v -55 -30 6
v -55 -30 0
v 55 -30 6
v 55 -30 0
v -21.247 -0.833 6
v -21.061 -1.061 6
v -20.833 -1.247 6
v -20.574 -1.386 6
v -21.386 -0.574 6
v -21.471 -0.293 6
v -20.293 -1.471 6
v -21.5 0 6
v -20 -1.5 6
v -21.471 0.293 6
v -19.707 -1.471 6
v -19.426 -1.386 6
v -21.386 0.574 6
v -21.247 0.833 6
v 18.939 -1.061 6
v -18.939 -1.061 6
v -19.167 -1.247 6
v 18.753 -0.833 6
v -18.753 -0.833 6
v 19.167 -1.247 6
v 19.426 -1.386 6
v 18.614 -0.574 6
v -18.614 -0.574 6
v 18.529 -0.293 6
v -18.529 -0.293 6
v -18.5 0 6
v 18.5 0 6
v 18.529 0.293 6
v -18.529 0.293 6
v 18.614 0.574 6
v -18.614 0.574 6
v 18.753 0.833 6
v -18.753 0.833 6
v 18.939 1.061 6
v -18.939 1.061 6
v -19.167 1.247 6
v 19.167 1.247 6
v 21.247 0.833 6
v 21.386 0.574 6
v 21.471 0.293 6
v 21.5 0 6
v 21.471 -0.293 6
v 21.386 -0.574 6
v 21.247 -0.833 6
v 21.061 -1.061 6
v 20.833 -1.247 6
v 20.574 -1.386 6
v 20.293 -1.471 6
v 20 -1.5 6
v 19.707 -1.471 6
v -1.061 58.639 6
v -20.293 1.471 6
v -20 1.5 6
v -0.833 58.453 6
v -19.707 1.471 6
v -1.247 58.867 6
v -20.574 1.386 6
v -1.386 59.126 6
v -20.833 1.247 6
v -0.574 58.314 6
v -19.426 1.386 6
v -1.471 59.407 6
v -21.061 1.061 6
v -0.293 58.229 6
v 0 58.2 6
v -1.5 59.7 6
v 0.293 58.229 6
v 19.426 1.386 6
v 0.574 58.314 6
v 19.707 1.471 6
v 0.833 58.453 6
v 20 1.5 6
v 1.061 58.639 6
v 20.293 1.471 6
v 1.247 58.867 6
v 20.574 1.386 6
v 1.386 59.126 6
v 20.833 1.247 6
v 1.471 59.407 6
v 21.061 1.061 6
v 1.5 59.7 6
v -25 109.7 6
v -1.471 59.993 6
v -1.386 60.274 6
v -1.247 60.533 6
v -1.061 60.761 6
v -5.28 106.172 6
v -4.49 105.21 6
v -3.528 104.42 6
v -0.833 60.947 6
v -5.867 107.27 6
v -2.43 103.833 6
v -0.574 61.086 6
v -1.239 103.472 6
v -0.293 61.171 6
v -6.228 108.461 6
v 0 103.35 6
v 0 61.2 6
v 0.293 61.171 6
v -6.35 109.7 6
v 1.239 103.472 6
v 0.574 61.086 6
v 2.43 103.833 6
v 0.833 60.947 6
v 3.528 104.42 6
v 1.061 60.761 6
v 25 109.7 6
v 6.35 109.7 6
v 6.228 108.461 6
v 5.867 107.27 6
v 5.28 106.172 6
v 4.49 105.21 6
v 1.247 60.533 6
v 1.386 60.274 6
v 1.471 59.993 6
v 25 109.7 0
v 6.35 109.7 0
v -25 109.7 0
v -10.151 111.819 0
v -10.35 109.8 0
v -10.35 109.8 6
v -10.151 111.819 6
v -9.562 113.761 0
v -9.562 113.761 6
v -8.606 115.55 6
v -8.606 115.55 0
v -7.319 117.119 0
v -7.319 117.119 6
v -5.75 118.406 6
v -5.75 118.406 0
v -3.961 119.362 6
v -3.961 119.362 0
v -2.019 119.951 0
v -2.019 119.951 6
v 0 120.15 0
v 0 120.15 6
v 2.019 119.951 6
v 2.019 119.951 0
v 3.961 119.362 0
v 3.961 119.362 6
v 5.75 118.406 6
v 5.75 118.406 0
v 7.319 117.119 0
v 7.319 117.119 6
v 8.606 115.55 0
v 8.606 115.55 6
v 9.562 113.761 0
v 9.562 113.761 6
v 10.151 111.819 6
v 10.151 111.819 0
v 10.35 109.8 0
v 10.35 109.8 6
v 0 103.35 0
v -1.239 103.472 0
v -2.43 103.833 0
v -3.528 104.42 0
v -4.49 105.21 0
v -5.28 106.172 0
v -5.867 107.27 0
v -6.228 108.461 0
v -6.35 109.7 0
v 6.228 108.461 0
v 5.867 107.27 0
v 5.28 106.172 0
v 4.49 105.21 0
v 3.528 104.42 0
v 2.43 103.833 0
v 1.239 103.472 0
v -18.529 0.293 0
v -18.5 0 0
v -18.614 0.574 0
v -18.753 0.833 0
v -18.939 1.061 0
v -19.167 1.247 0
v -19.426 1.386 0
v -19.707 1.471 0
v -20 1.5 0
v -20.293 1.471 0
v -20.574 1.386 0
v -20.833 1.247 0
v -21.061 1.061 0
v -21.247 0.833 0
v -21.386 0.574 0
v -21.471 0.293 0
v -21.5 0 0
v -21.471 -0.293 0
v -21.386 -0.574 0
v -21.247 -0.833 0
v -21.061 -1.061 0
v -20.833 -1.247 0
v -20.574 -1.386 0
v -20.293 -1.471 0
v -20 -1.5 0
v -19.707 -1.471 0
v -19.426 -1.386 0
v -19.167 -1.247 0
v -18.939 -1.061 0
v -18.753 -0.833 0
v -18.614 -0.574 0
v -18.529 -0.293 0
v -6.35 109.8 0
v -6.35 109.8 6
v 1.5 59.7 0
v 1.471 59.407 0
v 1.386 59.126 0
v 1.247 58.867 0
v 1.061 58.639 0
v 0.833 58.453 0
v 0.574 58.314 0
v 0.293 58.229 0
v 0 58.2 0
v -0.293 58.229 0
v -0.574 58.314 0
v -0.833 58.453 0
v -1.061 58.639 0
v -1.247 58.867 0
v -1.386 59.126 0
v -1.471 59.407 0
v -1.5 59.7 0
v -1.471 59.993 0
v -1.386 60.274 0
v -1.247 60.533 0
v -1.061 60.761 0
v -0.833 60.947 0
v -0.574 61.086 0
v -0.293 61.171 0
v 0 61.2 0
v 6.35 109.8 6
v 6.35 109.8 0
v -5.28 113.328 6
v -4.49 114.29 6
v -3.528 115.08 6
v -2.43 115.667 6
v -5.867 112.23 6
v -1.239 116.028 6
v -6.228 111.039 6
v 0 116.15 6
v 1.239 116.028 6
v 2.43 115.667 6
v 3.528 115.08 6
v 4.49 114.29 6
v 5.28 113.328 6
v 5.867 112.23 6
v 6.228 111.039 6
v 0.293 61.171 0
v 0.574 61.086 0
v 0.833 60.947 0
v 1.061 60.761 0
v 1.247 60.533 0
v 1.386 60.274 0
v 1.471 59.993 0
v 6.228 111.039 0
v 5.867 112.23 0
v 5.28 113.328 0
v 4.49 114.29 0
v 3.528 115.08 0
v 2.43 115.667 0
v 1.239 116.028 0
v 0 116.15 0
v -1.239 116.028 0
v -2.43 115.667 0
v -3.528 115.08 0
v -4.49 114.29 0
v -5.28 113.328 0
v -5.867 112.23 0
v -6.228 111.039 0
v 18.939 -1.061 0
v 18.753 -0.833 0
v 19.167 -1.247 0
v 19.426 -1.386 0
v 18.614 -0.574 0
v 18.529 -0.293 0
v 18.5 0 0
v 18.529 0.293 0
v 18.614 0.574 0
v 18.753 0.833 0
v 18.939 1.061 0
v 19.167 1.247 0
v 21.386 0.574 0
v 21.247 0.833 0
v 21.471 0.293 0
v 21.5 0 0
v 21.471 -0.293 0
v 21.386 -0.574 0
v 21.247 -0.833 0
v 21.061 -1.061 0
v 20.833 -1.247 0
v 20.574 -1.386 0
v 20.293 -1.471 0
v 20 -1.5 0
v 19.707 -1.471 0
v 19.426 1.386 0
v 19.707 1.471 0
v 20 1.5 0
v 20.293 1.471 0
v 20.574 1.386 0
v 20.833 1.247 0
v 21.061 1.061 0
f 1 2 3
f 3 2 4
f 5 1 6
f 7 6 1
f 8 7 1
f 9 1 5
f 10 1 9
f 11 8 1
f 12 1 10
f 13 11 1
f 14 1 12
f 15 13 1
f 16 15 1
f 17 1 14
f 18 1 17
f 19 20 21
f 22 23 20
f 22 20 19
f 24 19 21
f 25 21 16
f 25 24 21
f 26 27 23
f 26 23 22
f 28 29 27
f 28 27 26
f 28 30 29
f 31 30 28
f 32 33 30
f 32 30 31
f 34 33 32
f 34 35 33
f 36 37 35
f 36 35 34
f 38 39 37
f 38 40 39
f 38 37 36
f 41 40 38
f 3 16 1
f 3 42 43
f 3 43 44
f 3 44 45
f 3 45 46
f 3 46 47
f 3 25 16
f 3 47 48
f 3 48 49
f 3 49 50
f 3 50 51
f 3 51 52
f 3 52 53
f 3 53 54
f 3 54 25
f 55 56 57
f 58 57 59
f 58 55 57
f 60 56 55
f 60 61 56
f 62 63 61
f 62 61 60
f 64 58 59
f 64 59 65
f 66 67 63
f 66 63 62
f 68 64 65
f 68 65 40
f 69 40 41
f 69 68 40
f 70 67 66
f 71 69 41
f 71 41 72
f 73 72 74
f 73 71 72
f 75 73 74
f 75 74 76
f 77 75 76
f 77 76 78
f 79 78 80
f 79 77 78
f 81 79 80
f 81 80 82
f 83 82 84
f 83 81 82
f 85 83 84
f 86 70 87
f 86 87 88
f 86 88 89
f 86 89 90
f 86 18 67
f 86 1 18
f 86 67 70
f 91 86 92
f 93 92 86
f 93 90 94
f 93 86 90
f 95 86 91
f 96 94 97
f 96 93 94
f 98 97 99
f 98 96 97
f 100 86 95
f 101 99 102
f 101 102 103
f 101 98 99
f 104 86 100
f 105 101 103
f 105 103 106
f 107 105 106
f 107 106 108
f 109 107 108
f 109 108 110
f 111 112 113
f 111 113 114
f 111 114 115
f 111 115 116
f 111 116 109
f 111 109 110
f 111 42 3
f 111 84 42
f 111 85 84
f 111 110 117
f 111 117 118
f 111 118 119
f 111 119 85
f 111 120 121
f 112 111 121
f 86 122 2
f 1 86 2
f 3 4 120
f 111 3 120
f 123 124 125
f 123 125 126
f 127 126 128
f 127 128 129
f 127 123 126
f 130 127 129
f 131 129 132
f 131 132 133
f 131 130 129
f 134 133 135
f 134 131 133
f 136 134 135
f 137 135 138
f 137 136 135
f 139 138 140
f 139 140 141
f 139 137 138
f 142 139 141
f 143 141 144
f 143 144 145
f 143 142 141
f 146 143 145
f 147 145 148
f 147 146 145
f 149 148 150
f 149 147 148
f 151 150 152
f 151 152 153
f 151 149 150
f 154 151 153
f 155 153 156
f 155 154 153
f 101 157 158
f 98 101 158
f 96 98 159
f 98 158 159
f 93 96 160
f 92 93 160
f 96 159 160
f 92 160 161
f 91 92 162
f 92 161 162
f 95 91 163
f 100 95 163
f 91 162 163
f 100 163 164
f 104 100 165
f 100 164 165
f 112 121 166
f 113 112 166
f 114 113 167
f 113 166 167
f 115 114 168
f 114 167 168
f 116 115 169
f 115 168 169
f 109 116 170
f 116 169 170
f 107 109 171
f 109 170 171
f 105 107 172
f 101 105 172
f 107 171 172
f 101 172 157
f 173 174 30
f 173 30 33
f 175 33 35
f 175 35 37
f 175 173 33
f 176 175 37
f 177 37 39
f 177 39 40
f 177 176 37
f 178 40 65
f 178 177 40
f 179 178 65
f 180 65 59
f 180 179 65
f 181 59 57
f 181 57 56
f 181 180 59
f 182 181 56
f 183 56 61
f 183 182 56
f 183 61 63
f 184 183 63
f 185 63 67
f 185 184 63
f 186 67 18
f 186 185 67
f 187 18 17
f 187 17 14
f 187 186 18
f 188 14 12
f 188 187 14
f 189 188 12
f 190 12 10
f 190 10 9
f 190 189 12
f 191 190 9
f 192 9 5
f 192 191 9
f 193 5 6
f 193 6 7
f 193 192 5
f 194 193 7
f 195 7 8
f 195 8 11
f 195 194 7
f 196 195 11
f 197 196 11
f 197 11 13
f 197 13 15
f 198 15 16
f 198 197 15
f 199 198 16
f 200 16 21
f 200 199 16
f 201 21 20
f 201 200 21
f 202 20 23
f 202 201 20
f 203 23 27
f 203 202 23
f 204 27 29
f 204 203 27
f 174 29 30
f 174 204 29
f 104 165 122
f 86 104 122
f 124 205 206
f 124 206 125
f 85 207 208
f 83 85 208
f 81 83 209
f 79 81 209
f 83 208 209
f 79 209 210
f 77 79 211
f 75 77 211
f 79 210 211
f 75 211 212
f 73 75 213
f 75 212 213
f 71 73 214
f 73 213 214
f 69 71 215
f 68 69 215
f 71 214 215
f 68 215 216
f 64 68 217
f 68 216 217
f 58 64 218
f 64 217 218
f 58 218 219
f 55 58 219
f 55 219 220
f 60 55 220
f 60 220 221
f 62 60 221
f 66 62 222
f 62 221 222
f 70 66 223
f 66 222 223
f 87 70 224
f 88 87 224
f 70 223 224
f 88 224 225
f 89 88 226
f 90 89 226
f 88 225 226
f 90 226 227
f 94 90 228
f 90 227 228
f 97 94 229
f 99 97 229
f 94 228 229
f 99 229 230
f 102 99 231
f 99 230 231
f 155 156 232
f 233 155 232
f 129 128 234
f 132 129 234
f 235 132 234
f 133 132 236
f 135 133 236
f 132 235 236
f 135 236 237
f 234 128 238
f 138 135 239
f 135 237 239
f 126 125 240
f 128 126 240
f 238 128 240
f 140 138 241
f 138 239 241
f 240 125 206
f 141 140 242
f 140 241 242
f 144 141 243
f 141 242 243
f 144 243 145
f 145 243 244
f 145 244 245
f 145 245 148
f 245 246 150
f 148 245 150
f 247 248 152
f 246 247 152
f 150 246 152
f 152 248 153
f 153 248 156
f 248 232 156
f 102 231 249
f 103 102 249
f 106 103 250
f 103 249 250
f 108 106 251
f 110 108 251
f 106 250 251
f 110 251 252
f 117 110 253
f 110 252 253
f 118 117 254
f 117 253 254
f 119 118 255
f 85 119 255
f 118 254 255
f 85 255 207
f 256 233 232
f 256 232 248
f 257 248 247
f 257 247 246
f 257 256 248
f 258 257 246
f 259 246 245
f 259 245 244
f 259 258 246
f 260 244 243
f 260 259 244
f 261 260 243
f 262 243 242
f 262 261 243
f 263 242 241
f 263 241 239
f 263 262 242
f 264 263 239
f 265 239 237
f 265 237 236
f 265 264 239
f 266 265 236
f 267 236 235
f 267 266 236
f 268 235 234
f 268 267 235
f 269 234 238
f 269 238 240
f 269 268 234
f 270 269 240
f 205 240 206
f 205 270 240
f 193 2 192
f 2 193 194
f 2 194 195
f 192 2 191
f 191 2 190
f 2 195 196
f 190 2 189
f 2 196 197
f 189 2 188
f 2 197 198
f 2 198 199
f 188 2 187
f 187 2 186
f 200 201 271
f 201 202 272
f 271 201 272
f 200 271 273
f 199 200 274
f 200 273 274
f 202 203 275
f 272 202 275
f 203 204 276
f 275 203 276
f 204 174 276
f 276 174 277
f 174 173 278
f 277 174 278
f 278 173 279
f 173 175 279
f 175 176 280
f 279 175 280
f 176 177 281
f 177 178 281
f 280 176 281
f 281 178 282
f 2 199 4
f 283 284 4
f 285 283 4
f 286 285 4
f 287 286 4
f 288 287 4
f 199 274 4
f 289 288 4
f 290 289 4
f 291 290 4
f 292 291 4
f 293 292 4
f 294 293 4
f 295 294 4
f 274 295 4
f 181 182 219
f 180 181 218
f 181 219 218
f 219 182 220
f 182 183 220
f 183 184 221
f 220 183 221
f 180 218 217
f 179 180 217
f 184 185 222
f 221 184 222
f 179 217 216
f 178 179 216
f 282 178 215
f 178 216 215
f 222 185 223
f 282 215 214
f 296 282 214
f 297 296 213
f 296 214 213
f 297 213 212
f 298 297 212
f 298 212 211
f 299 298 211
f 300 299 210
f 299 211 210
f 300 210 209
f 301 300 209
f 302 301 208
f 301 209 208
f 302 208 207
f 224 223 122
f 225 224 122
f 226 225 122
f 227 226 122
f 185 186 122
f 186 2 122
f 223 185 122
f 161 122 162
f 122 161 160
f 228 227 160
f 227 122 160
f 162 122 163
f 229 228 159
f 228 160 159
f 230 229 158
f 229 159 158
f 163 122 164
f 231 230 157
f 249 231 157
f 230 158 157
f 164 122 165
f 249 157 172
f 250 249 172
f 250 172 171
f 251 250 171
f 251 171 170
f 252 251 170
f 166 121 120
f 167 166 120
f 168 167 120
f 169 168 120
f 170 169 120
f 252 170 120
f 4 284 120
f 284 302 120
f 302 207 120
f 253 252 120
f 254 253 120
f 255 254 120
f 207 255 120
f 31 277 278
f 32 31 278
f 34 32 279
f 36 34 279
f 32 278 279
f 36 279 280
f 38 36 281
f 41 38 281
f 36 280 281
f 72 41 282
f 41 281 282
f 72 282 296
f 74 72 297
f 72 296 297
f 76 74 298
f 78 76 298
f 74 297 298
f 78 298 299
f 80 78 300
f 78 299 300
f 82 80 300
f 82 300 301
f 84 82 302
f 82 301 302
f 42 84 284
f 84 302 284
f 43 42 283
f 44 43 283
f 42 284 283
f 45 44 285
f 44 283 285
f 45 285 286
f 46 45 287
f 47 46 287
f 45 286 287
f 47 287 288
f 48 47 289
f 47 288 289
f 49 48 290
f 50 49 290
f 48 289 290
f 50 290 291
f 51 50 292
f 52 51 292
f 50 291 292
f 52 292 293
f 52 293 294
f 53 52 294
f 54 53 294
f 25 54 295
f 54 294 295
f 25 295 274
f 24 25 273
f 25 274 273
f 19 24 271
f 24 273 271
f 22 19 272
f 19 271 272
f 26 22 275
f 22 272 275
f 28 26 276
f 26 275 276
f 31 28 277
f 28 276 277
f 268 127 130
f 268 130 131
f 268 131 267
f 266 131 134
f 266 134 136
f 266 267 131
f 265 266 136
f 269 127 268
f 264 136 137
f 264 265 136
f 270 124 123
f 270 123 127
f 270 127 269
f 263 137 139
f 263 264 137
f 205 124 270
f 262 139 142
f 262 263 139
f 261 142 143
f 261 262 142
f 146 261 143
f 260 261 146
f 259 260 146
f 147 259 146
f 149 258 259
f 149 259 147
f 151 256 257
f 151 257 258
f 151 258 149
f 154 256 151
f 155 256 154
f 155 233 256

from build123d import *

# Parameters (mm, degrees)
F0_R     = 1.5
F1_DEPTH = 6
F3_DEPTH = 6


with BuildPart() as f1:
    # F0 (on Top) → F1 (new body)
    with BuildSketch(Plane.XY):
        with BuildLine():
            Line((-55, -30), (0, -30))
            Line((0, -30), (55, -30))
            Line((55, -30), (25, 109.7))
            Line((25, 109.7), (6.35, 109.7))
            ThreePointArc((6.35, 109.7), (4.490128, 105.209872), (0, 103.35))
            ThreePointArc((0, 103.35), (-4.490128, 105.209872), (-6.35, 109.7))
            Line((-6.35, 109.7), (-25, 109.7))
            Line((-25, 109.7), (-55, -30))
        make_face()
        with Locations((-20, 0)):
            Circle(F0_R, mode=Mode.SUBTRACT)
        with BuildLine():
            ThreePointArc((21.5, 0), (20, -1.5), (18.5, 0))
            ThreePointArc((18.5, 0), (20, 1.5), (21.5, 0))
        make_face(mode=Mode.SUBTRACT)
        with BuildLine():
            ThreePointArc((1.5, 59.7), (-1.06066, 58.63934), (0, 61.2))
            ThreePointArc((0, 61.2), (1.06066, 60.76066), (1.5, 59.7))
        make_face(mode=Mode.SUBTRACT)
    extrude(amount=F1_DEPTH)


with BuildPart() as f3:
    # F2 (on face) → F3 (new body)
    with BuildSketch(Plane(origin=(0, 0, 0), x_dir=(1, 0, 0), z_dir=(0, 0, -1))):
        with BuildLine():
            ThreePointArc((6.35, -109.8), (0, -116.15), (-6.35, -109.8))
            Line((-6.35, -109.8), (-10.35, -109.8))
            ThreePointArc((-10.35, -109.8), (0, -120.15), (10.35, -109.8))
            Line((10.35, -109.8), (6.35, -109.8))
        make_face()
    extrude(amount=-F3_DEPTH)


solid = Compound([f1.part, f3.part])
